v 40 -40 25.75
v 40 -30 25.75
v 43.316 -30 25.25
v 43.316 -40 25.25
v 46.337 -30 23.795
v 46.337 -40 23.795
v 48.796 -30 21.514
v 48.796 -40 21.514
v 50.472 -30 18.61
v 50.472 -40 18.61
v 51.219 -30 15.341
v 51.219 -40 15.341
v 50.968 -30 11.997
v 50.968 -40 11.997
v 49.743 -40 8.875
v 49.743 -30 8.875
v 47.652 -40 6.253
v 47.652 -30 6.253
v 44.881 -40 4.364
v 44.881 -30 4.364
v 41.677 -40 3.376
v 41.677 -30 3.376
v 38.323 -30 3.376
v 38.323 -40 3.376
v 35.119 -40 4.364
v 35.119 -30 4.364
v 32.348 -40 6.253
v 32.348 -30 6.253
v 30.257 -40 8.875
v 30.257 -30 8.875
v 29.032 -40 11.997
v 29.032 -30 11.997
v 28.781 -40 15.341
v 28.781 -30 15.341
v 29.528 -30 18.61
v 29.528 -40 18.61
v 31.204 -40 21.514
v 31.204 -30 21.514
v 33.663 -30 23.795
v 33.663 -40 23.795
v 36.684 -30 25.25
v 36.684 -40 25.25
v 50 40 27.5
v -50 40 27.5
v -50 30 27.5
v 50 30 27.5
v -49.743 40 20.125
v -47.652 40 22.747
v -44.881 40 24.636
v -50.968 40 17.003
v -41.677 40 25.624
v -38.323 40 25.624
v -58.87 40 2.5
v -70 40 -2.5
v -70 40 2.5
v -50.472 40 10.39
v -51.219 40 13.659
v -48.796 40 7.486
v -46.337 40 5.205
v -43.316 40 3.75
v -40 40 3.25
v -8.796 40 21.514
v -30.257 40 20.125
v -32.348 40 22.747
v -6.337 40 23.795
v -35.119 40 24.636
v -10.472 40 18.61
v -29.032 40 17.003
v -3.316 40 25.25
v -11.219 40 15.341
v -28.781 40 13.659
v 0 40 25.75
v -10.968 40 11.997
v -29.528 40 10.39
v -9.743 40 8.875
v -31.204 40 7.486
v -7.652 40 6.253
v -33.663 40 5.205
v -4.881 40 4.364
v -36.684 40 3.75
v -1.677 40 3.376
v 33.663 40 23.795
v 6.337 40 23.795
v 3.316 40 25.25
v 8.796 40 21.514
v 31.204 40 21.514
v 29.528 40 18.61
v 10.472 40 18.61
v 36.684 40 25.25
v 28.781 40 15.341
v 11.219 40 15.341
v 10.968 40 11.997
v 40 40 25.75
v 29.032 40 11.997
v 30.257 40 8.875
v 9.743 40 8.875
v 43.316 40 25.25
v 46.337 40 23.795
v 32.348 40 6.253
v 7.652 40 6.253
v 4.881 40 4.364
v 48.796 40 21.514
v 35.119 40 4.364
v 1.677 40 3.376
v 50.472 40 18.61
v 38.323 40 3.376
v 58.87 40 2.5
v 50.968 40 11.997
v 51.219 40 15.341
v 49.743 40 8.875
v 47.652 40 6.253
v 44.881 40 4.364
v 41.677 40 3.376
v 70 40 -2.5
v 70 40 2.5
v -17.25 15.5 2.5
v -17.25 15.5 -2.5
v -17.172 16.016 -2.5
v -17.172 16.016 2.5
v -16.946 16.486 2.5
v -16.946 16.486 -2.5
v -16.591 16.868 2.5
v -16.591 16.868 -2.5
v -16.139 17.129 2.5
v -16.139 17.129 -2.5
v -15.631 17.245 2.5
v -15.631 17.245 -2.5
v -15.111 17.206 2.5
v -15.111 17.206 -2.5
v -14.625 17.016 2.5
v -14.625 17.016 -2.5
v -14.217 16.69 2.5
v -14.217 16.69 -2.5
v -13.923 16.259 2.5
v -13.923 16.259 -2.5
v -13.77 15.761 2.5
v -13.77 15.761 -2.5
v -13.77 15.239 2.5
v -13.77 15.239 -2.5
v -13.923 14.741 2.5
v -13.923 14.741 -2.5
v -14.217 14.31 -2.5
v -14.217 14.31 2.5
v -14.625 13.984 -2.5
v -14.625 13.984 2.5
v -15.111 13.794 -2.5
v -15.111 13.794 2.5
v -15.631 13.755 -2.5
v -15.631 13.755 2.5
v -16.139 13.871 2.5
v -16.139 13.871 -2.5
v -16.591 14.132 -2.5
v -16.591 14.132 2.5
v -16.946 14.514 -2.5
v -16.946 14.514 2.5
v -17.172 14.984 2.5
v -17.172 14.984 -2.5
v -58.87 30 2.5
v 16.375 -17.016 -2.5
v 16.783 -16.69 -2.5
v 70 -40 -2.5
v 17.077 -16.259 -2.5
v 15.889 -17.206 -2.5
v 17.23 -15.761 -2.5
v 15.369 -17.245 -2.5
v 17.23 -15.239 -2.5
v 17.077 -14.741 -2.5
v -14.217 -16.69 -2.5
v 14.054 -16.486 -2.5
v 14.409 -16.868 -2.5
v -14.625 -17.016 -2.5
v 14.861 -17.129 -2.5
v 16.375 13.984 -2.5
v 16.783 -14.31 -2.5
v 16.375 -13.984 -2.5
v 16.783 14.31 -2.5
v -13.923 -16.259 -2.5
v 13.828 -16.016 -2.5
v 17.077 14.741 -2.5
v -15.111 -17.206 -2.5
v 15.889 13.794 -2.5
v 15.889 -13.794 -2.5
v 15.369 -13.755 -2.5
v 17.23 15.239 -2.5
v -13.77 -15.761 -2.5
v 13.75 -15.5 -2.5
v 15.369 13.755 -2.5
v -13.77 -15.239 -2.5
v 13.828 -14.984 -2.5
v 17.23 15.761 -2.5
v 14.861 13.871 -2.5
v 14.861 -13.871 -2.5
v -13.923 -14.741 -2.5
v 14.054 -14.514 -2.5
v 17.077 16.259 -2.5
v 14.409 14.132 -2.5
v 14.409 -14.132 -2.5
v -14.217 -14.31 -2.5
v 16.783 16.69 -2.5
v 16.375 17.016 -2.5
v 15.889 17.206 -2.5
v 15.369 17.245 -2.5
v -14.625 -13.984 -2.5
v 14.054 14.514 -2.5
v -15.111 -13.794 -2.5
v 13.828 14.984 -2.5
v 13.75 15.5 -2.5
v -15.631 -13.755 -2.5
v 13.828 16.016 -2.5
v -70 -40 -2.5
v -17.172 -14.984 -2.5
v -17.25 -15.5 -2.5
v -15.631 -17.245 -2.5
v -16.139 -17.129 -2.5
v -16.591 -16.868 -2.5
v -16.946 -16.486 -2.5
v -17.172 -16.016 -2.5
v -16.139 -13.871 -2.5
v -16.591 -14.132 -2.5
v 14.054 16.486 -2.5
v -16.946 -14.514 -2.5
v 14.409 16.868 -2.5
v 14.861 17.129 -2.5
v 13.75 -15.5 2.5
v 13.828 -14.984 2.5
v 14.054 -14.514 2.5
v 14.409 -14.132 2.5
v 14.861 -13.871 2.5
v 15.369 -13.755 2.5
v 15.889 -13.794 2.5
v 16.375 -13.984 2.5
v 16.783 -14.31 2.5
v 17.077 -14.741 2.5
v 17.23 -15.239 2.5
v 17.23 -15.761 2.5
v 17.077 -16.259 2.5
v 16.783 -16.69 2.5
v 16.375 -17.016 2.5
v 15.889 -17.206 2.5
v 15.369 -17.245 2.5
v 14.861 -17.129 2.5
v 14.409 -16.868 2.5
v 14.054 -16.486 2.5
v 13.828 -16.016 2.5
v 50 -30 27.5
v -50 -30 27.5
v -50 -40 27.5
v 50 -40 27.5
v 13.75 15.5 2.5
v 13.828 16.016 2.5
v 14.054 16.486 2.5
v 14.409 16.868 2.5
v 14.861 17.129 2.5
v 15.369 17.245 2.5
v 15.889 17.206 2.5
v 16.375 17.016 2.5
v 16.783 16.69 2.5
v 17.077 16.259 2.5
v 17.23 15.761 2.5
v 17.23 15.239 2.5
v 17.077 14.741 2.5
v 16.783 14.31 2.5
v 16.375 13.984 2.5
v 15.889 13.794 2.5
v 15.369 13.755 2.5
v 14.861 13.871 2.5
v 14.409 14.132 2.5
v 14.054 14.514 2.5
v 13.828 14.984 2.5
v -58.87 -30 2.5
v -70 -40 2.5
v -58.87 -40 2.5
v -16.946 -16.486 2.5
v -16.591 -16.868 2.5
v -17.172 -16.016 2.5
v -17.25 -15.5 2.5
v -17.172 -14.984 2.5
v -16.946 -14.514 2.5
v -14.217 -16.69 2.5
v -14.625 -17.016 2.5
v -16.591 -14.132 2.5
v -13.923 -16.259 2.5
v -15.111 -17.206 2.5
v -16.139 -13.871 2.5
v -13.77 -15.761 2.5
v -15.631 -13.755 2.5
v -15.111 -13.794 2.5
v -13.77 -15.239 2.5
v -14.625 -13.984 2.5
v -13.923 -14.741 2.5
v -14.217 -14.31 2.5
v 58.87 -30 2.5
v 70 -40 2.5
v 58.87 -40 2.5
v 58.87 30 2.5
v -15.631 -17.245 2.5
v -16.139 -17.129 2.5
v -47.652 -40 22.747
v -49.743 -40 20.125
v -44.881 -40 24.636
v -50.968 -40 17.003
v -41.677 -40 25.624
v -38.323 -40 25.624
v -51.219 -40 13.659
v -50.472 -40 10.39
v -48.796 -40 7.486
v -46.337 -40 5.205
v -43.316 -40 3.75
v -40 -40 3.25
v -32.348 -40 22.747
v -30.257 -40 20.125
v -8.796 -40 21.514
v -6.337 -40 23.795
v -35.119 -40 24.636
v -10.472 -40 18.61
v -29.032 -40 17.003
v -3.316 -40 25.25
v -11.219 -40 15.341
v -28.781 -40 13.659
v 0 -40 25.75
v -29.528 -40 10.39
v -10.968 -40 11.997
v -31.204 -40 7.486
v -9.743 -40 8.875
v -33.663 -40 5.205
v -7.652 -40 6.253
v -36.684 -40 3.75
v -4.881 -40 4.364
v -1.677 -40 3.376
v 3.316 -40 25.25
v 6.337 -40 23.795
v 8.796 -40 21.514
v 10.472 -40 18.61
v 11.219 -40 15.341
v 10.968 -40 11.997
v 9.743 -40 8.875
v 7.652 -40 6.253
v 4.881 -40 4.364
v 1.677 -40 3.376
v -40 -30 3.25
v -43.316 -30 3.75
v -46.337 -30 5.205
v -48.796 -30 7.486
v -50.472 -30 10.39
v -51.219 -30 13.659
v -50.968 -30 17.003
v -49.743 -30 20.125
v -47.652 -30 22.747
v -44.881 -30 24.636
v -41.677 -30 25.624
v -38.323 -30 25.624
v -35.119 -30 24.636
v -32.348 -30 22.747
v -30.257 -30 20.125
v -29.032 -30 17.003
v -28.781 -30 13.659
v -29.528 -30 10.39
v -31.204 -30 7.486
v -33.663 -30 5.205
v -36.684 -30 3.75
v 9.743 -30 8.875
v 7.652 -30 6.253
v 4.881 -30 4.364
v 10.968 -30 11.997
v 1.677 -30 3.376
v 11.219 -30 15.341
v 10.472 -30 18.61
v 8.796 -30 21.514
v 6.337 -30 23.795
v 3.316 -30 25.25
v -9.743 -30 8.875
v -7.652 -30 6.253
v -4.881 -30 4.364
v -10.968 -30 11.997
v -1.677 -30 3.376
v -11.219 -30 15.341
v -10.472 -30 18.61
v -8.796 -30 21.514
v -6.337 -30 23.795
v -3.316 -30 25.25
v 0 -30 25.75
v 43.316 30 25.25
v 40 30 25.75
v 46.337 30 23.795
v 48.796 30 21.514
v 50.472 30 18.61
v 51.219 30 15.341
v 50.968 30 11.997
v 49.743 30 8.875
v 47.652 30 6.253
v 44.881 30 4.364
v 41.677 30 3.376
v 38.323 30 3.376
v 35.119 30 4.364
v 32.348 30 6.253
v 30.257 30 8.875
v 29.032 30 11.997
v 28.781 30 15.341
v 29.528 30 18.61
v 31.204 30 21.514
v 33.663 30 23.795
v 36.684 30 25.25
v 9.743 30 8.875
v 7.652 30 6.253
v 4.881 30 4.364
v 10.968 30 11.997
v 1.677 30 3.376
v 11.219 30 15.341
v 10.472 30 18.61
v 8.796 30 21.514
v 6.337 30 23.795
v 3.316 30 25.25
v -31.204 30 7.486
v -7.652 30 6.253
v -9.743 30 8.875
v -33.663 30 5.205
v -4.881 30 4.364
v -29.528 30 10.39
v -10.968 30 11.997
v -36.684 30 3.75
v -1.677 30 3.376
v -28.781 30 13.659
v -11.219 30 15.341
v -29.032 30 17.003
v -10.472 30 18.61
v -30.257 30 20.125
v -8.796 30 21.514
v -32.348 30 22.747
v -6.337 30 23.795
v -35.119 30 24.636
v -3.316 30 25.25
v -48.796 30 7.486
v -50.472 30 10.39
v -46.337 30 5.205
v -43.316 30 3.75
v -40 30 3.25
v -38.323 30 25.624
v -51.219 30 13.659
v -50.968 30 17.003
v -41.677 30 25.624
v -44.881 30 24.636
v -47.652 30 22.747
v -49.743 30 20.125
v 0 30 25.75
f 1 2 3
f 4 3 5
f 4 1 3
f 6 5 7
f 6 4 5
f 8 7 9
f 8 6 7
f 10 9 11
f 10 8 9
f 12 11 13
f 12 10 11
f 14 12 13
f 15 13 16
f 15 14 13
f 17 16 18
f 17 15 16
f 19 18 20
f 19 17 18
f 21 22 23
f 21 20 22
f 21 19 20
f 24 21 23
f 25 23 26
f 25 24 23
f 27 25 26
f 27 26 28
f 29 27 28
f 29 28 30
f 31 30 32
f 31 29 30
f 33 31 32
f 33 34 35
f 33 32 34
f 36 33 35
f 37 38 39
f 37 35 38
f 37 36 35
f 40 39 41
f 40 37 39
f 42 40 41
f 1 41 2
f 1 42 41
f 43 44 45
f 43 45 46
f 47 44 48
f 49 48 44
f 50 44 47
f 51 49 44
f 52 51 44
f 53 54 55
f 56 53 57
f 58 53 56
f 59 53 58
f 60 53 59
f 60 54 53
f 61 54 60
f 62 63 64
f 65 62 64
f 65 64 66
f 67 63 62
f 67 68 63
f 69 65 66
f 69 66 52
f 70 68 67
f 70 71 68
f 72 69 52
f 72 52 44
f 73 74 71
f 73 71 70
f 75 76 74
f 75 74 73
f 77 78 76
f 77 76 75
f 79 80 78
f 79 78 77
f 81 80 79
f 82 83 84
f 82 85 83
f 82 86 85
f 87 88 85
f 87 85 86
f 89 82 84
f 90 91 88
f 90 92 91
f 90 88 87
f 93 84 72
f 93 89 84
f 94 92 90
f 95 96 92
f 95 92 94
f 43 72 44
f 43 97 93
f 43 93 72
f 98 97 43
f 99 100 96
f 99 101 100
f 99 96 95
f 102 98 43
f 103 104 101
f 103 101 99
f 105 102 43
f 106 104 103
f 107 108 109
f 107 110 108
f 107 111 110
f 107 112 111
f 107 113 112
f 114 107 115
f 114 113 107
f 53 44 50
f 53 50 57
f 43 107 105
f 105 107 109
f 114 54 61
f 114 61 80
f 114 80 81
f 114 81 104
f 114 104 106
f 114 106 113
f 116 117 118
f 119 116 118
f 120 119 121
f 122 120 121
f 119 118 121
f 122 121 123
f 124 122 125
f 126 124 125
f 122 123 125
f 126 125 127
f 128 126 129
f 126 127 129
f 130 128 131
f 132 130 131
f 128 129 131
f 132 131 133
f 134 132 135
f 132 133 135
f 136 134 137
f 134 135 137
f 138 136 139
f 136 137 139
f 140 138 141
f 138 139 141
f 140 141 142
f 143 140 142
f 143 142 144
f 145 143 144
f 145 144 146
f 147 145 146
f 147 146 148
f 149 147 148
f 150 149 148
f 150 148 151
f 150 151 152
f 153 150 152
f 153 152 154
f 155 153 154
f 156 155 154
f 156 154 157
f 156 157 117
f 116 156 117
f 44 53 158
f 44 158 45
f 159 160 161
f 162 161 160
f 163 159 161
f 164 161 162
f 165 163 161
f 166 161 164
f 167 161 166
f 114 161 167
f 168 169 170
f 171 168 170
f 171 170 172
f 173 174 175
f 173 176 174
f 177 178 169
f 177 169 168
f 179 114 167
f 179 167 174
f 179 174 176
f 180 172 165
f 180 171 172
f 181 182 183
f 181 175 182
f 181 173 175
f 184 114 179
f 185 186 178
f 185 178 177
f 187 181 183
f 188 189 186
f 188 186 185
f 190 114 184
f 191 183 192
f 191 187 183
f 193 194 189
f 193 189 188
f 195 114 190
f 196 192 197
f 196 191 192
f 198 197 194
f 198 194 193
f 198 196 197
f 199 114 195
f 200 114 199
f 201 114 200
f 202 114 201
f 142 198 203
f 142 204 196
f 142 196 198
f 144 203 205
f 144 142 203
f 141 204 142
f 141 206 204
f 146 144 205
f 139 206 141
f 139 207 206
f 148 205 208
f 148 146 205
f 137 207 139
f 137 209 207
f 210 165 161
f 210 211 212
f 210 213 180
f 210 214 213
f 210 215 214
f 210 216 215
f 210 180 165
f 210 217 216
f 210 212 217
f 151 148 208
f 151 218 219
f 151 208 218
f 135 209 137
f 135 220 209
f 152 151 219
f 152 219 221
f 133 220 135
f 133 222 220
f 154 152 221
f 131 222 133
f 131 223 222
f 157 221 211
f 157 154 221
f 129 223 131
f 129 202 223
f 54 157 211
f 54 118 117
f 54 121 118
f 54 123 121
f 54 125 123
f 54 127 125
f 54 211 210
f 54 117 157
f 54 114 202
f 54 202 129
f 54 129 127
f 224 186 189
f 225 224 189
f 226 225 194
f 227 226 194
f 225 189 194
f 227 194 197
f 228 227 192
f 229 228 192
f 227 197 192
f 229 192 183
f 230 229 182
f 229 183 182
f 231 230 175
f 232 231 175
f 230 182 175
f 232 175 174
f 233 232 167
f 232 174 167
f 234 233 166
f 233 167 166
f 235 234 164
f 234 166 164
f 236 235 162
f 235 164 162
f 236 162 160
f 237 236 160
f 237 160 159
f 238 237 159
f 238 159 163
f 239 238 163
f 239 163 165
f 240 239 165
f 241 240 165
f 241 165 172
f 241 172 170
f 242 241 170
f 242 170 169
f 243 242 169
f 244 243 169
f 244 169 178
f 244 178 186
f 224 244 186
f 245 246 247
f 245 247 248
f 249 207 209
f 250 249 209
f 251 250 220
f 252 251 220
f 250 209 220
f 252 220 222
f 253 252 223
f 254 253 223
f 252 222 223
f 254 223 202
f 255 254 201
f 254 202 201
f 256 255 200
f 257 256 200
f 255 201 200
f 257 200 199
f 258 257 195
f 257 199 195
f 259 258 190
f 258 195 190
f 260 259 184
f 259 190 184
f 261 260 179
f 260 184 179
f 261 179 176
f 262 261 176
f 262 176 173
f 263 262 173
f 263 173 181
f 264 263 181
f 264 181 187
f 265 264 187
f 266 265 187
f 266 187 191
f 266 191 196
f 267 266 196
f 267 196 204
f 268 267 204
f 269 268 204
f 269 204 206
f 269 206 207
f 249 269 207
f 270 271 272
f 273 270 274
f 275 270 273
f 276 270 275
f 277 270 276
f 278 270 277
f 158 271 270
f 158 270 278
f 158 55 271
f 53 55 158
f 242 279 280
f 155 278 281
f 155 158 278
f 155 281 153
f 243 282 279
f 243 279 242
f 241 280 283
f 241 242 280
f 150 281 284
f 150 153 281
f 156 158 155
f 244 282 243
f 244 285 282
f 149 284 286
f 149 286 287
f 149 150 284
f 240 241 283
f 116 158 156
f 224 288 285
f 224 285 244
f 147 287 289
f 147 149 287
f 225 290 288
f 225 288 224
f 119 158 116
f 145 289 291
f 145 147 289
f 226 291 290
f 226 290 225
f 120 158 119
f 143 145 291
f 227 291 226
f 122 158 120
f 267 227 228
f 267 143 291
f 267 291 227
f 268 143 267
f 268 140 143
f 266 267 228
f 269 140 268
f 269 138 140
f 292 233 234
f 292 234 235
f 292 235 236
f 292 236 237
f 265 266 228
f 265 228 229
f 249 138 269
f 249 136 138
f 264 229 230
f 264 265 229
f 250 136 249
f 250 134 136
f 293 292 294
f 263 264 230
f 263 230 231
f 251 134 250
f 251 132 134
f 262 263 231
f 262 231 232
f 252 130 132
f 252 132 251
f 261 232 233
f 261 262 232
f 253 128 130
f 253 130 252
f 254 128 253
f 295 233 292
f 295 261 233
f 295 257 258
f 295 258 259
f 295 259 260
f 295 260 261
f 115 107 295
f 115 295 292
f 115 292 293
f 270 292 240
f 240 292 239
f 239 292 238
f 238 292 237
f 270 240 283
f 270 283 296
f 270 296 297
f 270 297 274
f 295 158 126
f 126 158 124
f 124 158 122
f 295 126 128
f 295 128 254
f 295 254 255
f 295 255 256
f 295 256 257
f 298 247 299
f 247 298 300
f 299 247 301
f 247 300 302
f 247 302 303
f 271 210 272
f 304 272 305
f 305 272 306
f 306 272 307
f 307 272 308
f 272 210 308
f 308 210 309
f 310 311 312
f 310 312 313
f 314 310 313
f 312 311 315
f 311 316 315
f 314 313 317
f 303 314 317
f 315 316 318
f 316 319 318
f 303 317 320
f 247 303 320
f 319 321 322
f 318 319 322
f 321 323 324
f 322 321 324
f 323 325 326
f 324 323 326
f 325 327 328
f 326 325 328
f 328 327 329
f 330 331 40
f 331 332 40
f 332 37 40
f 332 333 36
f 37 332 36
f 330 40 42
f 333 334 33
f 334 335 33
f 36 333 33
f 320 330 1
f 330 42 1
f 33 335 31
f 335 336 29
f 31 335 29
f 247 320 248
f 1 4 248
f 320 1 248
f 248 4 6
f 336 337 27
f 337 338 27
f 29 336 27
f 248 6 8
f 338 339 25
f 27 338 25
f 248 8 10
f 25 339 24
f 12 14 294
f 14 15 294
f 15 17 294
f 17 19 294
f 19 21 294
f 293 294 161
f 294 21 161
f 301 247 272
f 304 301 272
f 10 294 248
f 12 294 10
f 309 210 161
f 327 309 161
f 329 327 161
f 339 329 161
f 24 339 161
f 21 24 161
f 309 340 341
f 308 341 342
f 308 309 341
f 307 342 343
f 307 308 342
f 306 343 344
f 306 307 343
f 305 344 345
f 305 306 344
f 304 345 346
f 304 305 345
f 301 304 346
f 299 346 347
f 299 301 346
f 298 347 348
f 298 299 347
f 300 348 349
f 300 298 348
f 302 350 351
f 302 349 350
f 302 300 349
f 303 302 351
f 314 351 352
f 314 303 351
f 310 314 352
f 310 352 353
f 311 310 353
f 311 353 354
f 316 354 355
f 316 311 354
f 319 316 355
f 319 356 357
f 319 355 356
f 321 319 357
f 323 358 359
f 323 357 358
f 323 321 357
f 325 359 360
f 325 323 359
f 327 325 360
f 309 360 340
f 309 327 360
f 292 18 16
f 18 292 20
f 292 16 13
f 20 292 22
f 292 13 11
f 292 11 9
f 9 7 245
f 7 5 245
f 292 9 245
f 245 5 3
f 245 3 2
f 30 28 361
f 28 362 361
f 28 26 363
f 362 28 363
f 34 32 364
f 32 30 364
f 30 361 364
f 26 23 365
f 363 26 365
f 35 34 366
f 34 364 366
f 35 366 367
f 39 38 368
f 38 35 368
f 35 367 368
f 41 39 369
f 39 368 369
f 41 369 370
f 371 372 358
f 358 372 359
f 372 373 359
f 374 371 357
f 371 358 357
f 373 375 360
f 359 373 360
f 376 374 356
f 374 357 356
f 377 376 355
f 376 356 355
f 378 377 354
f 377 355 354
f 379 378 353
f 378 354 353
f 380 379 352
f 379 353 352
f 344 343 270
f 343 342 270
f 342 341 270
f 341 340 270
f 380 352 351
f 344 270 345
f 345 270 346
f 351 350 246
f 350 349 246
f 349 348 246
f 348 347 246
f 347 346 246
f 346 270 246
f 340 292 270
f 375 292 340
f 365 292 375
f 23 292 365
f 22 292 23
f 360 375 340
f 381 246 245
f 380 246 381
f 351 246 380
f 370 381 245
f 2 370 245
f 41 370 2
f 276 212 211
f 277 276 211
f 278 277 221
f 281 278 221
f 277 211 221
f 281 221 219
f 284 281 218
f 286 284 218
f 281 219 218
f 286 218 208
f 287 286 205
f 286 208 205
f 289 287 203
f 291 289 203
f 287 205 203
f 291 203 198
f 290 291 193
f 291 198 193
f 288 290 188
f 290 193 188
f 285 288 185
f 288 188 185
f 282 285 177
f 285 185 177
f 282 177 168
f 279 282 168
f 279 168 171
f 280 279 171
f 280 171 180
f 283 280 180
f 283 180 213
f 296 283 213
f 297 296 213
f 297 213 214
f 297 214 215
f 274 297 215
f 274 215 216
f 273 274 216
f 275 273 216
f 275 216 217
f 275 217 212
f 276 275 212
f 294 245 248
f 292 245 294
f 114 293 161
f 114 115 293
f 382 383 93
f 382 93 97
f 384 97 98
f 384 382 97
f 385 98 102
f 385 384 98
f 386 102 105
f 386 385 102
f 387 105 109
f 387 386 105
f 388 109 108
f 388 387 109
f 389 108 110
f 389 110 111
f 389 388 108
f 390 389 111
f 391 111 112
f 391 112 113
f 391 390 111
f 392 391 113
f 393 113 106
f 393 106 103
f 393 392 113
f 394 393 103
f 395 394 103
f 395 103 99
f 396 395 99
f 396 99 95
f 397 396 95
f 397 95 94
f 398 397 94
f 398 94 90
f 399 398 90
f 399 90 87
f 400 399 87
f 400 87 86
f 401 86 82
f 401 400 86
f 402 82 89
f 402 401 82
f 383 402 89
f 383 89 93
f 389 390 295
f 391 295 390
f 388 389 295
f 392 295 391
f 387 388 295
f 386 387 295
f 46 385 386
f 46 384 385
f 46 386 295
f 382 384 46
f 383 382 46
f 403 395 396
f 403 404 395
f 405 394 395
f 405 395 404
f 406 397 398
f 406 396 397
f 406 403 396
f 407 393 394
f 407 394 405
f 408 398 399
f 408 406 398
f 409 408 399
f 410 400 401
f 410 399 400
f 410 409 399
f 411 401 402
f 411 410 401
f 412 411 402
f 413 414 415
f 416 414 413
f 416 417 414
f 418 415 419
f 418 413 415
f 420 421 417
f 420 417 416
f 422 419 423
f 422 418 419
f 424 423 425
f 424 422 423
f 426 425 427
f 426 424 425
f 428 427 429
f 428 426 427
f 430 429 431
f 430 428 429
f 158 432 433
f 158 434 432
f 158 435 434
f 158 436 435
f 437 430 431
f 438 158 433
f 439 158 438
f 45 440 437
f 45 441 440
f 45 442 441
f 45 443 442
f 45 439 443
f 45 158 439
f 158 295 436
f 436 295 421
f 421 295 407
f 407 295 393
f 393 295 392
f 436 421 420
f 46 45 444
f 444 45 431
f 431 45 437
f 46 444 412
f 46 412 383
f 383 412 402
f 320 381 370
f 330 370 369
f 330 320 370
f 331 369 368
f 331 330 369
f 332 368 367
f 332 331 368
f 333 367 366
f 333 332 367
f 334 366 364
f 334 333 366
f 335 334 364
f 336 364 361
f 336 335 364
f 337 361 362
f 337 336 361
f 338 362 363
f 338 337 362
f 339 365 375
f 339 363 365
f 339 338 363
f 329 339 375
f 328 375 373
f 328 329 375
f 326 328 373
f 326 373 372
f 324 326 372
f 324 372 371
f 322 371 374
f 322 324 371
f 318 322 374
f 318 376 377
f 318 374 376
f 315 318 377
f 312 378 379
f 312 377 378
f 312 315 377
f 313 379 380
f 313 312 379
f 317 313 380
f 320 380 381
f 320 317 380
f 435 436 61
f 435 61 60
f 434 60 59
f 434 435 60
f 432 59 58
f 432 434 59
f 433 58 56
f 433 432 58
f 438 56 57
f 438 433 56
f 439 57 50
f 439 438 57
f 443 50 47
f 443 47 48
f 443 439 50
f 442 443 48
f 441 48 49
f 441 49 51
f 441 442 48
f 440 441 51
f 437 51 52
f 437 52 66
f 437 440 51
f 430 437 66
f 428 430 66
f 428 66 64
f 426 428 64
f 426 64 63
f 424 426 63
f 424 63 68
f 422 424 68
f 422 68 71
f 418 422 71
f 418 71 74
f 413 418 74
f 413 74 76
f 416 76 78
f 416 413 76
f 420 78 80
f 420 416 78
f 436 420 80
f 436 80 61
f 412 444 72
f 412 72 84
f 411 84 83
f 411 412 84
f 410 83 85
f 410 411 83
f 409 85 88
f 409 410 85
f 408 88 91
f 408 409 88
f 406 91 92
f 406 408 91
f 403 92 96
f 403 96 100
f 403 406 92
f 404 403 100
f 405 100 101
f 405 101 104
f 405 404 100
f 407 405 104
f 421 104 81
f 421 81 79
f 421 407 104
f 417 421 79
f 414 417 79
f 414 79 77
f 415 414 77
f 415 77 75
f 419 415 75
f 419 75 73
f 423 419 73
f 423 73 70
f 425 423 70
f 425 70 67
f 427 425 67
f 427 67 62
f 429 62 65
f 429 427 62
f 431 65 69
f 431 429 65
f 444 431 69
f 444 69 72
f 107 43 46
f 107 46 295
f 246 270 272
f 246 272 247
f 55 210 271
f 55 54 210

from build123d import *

# Parameters (mm, degrees)
SKETCH_1_R          = 11.25
EXTRUDE_1_DEPTH     = 40
SKETCH_2_W          = 25
SKETCH_2_H          = 60
CUT_EXTRUDE1_DEPTH  = 149.176415127
SKETCH_3_R          = 1.75
CUT_EXTRUDE_1_DEPTH = 10


with BuildPart() as part:
    # Эскиз1 → Бобышка-Вытянуть1 (new, symmetric)
    with BuildSketch(Plane(origin=(0, 0, 0), x_dir=(1, 0, 0), z_dir=(0, 1, 0))):
        Polygon((-70, -2.5), (-58.870442851, -2.5), (-50, -27.5), (50, -27.5), (58.870442851, -2.5), (70, -2.5), (70, 2.5), (-70, 2.5), align=None)
        with Locations(Location((0, -14.5, 0), (0, 0, 270))):
            Circle(SKETCH_1_R, mode=Mode.SUBTRACT)
        with Locations(Location((40, -14.5, 0), (0, 0, 270))):
            Circle(SKETCH_1_R, mode=Mode.SUBTRACT)
        with Locations(Location((-40, -14.5, 0), (0, 0, 90))):
            Circle(SKETCH_1_R, mode=Mode.SUBTRACT)
    extrude(amount=EXTRUDE_1_DEPTH, both=True)

    # Эскиз2 → Cut-Extrude1 (cut, through all)
    with BuildSketch(Plane.ZY.offset(70)):
        with Locations((15, 0)):
            Rectangle(SKETCH_2_W, SKETCH_2_H)
    extrude(amount=-CUT_EXTRUDE1_DEPTH, mode=Mode.SUBTRACT)

    # Эскиз3 → Вырез-Вытянуть1 (cut)
    with BuildSketch(Plane(origin=(0, 0, -2.5), x_dir=(-1, 0, 0), z_dir=(0, 0, -1))):
        with Locations((-15.5, 15.5)):
            Circle(SKETCH_3_R)
        with Locations((15.5, 15.5)):
            Circle(SKETCH_3_R)
        with Locations((15.5, -15.5)):
            Circle(SKETCH_3_R)
        with Locations((-15.5, -15.5)):
            Circle(SKETCH_3_R)
    extrude(amount=-CUT_EXTRUDE_1_DEPTH, mode=Mode.SUBTRACT)


solid = part.part
